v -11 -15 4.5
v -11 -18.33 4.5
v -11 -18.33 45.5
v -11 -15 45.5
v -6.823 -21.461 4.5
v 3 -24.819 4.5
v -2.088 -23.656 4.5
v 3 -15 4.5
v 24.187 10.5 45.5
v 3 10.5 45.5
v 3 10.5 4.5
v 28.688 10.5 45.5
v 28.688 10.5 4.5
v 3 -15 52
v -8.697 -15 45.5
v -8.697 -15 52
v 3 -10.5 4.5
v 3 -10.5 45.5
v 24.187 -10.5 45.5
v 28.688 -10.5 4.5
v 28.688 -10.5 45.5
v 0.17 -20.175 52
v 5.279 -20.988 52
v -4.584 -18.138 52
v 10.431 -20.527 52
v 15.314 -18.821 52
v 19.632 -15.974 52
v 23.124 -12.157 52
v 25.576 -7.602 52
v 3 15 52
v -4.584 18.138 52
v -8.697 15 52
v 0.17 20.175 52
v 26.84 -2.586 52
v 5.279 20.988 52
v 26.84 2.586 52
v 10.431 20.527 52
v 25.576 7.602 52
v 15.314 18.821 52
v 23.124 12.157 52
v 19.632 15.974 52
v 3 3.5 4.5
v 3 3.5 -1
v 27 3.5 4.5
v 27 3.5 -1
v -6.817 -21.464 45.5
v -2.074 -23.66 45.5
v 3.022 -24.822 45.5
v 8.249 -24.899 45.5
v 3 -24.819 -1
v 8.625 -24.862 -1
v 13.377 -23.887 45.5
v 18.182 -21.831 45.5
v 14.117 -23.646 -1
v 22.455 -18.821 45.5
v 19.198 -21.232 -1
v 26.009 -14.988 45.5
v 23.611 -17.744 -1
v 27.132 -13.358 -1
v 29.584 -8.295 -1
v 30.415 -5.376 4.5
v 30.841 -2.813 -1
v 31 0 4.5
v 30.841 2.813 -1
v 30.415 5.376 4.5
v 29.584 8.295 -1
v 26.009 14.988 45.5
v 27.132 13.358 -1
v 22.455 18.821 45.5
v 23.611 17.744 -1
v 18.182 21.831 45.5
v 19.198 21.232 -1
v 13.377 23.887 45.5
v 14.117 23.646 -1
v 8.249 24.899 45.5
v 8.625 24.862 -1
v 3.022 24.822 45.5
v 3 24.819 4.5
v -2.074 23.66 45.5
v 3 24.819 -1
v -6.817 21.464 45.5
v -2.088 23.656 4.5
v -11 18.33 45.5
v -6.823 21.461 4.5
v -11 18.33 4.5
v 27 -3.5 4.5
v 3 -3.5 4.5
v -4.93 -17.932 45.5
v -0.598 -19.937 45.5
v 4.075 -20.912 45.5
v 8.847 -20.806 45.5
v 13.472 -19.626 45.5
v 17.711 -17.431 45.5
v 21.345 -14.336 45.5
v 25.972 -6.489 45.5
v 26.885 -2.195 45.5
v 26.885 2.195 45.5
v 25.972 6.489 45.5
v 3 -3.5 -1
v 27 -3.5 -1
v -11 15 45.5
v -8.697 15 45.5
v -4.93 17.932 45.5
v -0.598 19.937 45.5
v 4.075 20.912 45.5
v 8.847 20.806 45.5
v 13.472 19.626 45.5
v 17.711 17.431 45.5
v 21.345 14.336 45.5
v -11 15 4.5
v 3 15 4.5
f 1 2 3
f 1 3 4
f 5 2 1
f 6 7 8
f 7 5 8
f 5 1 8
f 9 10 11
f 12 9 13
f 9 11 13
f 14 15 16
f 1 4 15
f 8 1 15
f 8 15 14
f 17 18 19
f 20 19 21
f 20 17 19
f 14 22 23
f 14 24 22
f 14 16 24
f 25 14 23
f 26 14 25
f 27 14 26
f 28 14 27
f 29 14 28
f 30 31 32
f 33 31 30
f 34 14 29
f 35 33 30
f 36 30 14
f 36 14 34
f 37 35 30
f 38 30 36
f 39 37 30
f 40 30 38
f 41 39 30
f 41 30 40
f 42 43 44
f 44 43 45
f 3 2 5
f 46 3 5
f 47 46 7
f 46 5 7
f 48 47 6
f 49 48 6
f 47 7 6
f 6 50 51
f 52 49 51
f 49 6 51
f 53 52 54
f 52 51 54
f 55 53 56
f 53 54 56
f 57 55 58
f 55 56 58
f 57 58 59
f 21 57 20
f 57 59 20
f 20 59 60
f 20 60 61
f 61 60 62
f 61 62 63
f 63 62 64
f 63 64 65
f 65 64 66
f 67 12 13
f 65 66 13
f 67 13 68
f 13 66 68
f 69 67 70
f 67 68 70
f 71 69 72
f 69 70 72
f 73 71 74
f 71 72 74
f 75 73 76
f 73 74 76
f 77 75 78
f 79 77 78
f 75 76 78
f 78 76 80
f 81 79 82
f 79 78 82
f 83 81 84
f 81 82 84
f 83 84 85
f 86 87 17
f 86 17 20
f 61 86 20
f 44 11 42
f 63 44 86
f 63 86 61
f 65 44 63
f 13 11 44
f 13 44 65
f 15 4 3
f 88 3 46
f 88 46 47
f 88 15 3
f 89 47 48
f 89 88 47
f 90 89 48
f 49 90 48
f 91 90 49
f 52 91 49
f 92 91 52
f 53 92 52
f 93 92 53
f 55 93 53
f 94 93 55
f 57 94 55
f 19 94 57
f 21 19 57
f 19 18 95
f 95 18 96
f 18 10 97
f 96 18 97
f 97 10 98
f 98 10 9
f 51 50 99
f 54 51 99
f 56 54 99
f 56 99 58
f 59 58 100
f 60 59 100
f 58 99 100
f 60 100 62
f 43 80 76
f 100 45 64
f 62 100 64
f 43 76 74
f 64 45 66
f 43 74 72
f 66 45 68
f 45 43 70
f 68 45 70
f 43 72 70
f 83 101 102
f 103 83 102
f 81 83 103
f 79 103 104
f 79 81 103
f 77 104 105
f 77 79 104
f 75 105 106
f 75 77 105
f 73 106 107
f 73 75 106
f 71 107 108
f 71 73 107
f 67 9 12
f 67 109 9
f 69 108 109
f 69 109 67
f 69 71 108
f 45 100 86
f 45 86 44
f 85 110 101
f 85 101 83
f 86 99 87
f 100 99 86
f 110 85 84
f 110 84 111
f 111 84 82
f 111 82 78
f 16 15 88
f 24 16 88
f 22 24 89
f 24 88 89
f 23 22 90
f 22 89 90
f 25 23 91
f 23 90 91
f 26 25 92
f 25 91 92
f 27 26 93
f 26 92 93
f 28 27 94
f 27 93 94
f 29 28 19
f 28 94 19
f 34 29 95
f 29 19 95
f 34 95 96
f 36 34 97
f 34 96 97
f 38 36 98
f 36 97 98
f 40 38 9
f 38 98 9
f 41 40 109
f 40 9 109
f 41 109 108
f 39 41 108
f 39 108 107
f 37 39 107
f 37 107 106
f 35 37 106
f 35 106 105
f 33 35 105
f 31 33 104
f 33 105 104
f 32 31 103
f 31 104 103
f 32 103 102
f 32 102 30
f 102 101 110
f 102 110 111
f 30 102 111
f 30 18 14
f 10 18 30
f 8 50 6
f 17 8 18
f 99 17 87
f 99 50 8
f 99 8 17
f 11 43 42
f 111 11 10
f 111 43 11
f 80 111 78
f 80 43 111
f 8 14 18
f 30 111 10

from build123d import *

# Parameters (mm, degrees)
CYLINDER091_R     = 21
CYLINDER091_DEPTH = 6.5
CYLINDER092_R     = 25
CYLINDER092_DEPTH = 6.5
BOX032_W          = 14
BOX032_H          = 50
BOX032_DEPTH      = 5.5
BOX031_W          = 14
BOX031_H          = 30
BOX031_DEPTH      = 53
BOX004_W          = 24
BOX004_H          = 7
BOX004_DEPTH      = 7
BOX003_W          = 55
BOX003_H          = 56
BOX003_DEPTH      = 71
BOX002_W          = 50
BOX002_H          = 21
BOX002_DEPTH      = 41
CYLINDER033_R     = 25
CYLINDER033_DEPTH = 53


with BuildPart() as cylinder091:
    # Cylinder091 → Cylinder091 (new body)
    with BuildSketch(Plane(origin=(6, 0, 45.5), x_dir=(1, 0, 0), z_dir=(0, 0, 1))):
        Circle(CYLINDER091_R)
    extrude(amount=CYLINDER091_DEPTH)


with BuildPart() as cut096:
    # Cylinder092 → Cylinder092 (new body)
    with BuildSketch(Plane(origin=(6, 0, 45.5), x_dir=(1, 0, 0), z_dir=(0, 0, 1))):
        Circle(CYLINDER092_R)
    extrude(amount=CYLINDER092_DEPTH)

    # Cut096: cut Cylinder091
    add(cylinder091.part, mode=Mode.SUBTRACT)


with BuildPart() as cube016:
    # Box032 → Box032 (new body)
    with BuildSketch(Plane(origin=(-11, -25, -1), x_dir=(1, 0, 0), z_dir=(0, 0, 1))):
        with Locations((7, 25)):
            Rectangle(BOX032_W, BOX032_H)
    extrude(amount=BOX032_DEPTH)


with BuildPart() as cube015:
    # Box031 → Box031 (new body)
    with BuildSketch(Plane(origin=(-11, -15, -1), x_dir=(1, 0, 0), z_dir=(0, 0, 1))):
        with Locations((7, 15)):
            Rectangle(BOX031_W, BOX031_H)
    extrude(amount=BOX031_DEPTH)


with BuildPart() as cube004:
    # Box004 → Box004 (new body)
    with BuildSketch(Plane(origin=(3, -3.5, -1), x_dir=(1, 0, 0), z_dir=(0, 0, 1))):
        with Locations((12, 3.5)):
            Rectangle(BOX004_W, BOX004_H)
    extrude(amount=BOX004_DEPTH)


with BuildPart() as cube003:
    # Box003 → Box003 (new body)
    with BuildSketch(Plane(origin=(-66, -25, -15), x_dir=(1, 0, 0), z_dir=(0, 0, 1))):
        with Locations((27.5, 28)):
            Rectangle(BOX003_W, BOX003_H)
    extrude(amount=BOX003_DEPTH)


with BuildPart() as cube002:
    # Box002 → Box002 (new body)
    with BuildSketch(Plane(origin=(-15, -10.5, 4.5), x_dir=(1, 0, 0), z_dir=(0, 0, 1))):
        with Locations((25, 10.5)):
            Rectangle(BOX002_W, BOX002_H)
    extrude(amount=BOX002_DEPTH)


with BuildPart() as cut097:
    # Cylinder033 → Cylinder033 (new body)
    with BuildSketch(Plane(origin=(6, 0, -1), x_dir=(1, 0, 0), z_dir=(0, 0, 1))):
        Circle(CYLINDER033_R)
    extrude(amount=CYLINDER033_DEPTH)

    # Cut026: cut Cube002
    add(cube002.part, mode=Mode.SUBTRACT)

    # Cut027: cut Cube003
    add(cube003.part, mode=Mode.SUBTRACT)

    # Cut028: cut Cube004
    add(cube004.part, mode=Mode.SUBTRACT)

    # Cut089: cut Cube015
    add(cube015.part, mode=Mode.SUBTRACT)

    # Cut090: cut Cube016
    add(cube016.part, mode=Mode.SUBTRACT)

    # Cut097: cut Cut096
    add(cut096.part, mode=Mode.SUBTRACT)


solid = cut097.part
